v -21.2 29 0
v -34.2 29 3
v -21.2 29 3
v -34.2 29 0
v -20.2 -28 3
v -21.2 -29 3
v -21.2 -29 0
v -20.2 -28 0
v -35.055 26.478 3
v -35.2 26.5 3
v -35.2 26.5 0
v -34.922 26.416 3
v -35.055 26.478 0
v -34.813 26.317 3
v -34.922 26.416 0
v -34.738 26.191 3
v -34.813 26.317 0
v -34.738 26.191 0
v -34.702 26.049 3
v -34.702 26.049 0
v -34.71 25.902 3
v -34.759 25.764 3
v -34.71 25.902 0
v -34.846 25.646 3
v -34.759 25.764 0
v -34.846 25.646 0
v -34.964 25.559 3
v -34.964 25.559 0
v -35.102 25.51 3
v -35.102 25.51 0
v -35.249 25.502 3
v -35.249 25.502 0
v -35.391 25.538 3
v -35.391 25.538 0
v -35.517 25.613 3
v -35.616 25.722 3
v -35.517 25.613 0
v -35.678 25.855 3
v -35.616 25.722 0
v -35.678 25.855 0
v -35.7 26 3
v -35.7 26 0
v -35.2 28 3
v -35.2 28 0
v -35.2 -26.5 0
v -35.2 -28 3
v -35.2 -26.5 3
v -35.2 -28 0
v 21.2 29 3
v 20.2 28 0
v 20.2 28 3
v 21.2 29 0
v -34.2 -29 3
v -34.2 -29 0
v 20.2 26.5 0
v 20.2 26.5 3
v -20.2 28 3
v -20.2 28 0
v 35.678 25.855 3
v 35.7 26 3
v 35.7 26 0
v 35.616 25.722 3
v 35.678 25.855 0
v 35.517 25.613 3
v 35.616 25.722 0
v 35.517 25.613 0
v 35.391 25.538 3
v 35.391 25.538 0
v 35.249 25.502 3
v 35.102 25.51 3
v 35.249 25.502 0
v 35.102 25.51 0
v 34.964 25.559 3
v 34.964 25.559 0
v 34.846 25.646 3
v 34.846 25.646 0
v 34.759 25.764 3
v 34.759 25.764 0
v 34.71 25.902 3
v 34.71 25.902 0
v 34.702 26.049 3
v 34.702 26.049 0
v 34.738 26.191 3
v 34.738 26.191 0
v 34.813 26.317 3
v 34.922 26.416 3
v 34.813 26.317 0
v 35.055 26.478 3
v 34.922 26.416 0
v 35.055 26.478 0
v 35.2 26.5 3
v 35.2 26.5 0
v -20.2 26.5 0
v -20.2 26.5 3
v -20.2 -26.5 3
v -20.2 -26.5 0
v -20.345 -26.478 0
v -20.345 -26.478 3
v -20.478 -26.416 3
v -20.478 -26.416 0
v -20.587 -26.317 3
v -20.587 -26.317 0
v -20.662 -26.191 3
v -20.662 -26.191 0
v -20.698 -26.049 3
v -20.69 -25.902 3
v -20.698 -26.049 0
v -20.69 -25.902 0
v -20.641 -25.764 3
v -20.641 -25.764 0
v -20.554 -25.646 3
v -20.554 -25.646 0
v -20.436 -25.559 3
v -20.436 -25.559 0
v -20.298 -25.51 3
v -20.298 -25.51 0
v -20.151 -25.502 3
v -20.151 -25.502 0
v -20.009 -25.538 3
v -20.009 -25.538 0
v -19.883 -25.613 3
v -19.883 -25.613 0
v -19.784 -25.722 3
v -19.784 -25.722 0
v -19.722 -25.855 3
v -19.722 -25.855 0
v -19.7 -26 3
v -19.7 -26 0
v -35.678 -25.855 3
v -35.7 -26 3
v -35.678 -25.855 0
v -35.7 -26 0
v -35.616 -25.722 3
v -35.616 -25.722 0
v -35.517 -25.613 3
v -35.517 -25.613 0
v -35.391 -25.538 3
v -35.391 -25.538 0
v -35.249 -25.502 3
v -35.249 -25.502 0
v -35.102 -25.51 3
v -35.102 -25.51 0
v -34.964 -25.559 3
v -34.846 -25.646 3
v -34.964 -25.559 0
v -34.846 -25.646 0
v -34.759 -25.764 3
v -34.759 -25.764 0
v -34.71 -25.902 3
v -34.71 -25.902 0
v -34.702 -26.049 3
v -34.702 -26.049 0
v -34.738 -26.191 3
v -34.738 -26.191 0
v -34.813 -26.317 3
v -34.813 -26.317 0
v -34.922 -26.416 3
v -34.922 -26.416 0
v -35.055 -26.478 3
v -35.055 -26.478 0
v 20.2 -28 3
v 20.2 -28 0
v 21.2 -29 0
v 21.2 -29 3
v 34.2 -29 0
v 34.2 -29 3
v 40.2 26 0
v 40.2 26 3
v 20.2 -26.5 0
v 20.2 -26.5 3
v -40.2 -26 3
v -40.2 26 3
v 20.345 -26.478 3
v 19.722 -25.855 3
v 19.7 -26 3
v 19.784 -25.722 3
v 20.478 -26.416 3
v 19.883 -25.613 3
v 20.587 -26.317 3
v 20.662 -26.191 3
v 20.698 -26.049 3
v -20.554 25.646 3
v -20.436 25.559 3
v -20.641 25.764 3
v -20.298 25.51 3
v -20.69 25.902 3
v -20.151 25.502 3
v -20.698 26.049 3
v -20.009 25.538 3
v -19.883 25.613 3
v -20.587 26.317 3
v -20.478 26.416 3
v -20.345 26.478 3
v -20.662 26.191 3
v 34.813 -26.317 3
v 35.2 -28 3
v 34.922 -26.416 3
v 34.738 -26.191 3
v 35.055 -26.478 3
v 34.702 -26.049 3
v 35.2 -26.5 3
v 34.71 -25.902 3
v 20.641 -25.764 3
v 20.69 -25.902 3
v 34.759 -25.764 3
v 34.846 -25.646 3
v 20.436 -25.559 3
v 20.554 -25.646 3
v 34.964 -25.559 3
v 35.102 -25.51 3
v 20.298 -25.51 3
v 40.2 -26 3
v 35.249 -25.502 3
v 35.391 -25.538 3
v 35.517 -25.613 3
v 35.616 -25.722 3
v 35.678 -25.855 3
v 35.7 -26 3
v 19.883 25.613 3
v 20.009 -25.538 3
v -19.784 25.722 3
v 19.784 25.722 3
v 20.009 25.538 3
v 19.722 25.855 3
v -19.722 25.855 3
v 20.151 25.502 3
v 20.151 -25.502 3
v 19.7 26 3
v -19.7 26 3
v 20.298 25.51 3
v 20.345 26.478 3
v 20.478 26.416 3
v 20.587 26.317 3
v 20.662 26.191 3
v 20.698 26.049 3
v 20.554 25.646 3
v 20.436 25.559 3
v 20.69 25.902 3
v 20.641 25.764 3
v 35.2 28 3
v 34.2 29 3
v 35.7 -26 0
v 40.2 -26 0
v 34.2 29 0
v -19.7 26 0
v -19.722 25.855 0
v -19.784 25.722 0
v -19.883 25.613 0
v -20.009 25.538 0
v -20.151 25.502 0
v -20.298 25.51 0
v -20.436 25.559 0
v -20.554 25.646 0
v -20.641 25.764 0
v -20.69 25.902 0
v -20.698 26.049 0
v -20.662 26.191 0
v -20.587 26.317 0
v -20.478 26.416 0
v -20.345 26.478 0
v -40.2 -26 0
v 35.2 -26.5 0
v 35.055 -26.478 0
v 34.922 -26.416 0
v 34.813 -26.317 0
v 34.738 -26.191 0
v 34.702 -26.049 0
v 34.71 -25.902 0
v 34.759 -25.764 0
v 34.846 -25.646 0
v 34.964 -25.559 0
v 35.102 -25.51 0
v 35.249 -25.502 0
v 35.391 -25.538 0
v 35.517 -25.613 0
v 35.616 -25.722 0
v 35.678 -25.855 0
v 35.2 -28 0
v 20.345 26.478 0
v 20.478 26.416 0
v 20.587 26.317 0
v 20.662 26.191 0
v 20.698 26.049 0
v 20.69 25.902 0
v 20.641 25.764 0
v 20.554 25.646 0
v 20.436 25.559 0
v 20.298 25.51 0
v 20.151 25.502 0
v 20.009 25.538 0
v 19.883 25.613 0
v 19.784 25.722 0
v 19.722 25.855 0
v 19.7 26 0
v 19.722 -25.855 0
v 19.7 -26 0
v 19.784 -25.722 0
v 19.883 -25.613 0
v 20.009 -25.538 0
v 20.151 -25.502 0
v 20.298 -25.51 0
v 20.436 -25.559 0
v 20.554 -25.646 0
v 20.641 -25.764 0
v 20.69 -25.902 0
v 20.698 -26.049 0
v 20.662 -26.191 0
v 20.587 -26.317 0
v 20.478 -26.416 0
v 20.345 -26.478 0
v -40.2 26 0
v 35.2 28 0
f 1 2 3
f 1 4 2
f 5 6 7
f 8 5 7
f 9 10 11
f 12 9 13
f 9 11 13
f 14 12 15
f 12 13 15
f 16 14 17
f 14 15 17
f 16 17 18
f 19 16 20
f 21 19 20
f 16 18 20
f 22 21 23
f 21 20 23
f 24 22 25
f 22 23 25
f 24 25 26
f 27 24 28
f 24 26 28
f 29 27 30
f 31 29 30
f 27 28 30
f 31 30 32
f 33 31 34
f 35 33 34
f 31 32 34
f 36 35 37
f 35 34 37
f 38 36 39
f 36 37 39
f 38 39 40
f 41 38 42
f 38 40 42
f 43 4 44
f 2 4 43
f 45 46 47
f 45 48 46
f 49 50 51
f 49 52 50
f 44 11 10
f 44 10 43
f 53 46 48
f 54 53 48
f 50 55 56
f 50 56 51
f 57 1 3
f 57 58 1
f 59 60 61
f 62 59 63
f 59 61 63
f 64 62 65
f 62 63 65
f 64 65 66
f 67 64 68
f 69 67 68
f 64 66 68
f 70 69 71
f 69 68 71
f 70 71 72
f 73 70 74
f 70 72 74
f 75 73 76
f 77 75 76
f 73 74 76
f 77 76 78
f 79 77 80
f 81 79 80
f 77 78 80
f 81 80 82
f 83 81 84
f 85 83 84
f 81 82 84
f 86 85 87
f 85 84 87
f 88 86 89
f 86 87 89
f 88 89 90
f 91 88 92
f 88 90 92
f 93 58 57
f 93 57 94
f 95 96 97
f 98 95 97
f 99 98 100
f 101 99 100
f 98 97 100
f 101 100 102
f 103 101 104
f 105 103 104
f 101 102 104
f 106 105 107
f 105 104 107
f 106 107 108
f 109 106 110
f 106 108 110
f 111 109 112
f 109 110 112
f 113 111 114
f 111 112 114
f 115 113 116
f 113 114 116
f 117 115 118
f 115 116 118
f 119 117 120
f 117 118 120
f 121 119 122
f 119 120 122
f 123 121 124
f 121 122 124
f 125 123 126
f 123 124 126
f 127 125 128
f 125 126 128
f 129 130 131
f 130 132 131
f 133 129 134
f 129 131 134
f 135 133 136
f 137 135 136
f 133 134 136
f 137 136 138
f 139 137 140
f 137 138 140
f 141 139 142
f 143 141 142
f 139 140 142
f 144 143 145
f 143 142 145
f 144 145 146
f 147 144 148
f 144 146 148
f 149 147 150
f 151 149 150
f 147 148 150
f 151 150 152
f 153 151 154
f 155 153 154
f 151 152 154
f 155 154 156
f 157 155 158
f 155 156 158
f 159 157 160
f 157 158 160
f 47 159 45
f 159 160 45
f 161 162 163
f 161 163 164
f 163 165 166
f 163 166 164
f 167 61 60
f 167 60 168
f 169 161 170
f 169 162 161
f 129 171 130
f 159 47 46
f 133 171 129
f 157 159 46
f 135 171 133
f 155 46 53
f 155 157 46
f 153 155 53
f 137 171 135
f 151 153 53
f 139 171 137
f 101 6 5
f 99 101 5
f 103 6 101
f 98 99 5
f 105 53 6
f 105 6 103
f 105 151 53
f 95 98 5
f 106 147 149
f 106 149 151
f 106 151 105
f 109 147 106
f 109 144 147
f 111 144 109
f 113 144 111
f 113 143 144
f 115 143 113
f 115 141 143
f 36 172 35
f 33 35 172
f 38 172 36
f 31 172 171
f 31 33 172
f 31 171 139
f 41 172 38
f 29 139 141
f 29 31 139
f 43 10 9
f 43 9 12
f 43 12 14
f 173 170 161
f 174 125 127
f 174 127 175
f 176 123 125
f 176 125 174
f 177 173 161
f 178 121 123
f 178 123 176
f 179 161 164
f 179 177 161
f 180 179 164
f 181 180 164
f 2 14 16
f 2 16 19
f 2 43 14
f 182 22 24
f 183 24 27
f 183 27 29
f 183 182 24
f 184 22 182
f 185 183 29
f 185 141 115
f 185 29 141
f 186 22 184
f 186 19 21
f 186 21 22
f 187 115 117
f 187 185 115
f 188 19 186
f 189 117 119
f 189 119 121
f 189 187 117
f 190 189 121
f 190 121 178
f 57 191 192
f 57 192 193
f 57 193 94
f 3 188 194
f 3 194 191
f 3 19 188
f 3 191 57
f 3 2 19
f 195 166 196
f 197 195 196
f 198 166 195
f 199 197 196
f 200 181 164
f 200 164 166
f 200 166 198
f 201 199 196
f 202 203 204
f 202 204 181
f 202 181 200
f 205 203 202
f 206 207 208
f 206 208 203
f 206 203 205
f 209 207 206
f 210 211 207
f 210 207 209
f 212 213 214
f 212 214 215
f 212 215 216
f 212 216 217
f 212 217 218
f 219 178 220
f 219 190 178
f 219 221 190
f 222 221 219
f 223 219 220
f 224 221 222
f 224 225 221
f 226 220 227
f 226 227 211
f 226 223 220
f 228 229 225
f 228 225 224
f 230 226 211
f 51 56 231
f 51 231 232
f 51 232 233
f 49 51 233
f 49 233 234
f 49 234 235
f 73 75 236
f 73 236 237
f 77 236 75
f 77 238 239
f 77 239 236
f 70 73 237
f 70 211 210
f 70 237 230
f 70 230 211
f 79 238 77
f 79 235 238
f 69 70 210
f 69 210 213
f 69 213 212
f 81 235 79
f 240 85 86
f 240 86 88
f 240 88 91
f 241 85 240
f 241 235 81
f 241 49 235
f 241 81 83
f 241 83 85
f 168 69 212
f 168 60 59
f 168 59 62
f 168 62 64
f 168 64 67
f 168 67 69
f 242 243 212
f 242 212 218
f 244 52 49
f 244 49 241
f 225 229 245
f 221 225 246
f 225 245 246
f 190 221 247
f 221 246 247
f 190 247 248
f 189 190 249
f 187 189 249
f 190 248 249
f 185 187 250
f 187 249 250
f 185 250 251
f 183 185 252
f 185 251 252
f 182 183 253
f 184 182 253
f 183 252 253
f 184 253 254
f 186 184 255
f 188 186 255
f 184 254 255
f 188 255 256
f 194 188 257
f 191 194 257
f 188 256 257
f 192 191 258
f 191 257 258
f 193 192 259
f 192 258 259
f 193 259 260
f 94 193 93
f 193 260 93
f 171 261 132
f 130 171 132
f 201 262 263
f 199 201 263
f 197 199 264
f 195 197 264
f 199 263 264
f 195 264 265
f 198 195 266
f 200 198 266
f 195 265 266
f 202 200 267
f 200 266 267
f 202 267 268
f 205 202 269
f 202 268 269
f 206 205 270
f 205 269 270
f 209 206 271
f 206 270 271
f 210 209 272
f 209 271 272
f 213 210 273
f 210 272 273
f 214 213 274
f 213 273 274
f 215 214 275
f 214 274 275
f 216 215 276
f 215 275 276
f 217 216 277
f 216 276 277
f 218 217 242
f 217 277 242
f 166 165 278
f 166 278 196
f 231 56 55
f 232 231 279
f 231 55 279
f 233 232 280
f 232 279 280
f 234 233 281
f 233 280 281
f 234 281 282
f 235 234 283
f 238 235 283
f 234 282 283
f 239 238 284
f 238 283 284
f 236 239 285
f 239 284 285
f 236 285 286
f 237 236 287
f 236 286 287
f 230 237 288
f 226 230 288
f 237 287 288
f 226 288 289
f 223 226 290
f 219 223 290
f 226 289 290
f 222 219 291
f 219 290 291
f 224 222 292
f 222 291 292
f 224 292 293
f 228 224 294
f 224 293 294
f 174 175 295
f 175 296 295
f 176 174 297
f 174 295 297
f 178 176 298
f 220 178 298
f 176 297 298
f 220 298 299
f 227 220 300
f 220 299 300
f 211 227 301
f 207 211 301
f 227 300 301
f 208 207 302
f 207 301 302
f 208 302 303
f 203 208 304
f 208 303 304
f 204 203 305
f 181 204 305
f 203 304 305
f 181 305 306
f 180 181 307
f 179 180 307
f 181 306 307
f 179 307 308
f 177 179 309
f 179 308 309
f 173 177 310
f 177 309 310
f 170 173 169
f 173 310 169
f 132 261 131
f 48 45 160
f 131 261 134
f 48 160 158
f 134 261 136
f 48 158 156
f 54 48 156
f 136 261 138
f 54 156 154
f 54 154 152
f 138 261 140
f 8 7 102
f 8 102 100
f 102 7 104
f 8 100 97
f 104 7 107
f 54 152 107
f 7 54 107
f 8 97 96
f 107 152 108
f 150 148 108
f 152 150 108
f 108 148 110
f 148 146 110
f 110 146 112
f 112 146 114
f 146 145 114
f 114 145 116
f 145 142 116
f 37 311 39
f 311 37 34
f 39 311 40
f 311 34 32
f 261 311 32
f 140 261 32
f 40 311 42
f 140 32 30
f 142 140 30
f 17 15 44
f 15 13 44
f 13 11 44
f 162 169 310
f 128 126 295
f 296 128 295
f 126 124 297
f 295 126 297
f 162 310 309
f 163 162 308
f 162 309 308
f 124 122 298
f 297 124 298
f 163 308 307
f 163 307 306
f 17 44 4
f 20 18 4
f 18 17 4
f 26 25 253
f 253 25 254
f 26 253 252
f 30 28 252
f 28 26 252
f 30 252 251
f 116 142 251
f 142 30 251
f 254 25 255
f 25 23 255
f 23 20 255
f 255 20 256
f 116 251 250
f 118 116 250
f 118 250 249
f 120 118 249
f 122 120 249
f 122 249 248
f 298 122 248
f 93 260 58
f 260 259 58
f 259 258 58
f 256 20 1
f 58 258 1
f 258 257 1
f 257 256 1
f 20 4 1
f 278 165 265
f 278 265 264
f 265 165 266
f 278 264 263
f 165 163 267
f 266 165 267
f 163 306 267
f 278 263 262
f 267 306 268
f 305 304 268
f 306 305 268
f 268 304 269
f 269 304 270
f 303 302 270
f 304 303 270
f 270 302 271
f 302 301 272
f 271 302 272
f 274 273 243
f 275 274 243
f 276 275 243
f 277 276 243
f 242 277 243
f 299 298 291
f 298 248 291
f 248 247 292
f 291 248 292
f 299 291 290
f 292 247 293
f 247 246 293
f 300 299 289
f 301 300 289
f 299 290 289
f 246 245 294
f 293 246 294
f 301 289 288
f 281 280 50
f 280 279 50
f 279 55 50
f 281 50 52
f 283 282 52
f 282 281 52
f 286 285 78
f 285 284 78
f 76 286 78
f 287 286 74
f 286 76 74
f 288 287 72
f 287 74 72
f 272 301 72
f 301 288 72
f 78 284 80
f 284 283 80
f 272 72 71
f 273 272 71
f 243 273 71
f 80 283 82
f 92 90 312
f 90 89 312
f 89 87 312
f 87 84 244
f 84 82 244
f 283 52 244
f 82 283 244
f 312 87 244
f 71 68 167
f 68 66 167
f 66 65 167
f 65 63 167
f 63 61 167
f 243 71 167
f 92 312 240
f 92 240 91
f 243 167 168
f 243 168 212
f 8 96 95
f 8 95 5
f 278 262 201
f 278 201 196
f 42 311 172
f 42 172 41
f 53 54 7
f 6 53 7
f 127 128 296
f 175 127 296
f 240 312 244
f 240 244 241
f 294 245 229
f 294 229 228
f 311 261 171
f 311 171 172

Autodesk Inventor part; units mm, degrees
ref_plane "Plan YZ" through (0, 0, 0) normal (1, 0, 0) x (0, 1, 0)
ref_plane "Plan XZ" through (0, 0, 0) normal (0, 1, 0) x (-1, 0, 0)
ref_plane "Plan XY" through (0, 0, 0) normal (0, 0, 1) x (1, 0, 0)
sketch "Esquisse7" plane through (0, 0, 0) normal (0, 0, 1) x (1, 0, 0)
  line L0 (-40.2, -26) -> (-40.2, 26)
  line L1 (-40.2, 26) -> (-35.2, 26)
  line L2 (-35.2, 26) -> (-35.2, 29)
  line L3 (-35.2, 29) -> (-20.2, 29)
  line L4 (-20.2, 29) -> (-20.2, 26)
  line L5 (20.2, 26) -> (20.2, 29)
  line L6 (20.2, 29) -> (35.2, 29)
  line L7 (35.2, 29) -> (35.2, 26)
  line L8 (35.2, 26) -> (40.2, 26)
  line L9 (40.2, 26) -> (40.2, -26)
  line L10 (40.2, -26) -> (35.2, -26)
  line L11 (35.2, -26) -> (35.2, -29)
  line L12 (35.2, -29) -> (20.2, -29)
  line L13 (20.2, -29) -> (20.2, -26)
  line L14 (-20.2, -26) -> (-20.2, -29)
  line L15 (-35.2, -29) -> (-35.2, -26)
  line L16 (-40.2, -26) -> (-35.2, -26)
  line L17 (-35.2, -29) -> (-20.2, -29)
  line L18 (0, -40.6) -> (0, 40.6) construction
  line L19 (-56.28, 0) -> (56.28, 0) construction
  line L20 (-20.2, -26) -> (-7.5, -26)
  line L21 (7.5, -26) -> (20.2, -26)
  line L22 (-20.2, 26) -> (-7.5, 26)
  line L23 (7.5, 26) -> (20.2, 26)
  line L24 (-7.5, -26) -> (7.5, -26)
  line L25 (-7.5, 26) -> (7.5, 26)
  point P0 (0, 0)
  dimension "d33" = 52
  dimension "d34" = 5
  dimension "d35" = 3
  dimension "d36" = 15
  dimension "d51" = 80.4
extrude "Extrusion3" add sketch "Esquisse7" along normal blind 3
chamfer "Chanfrein5" distance 1 angle 45 8 edges at (-20.2, 29, 1.5) (-35.2, 29, 1.5) (20.2, 29, 1.5) (35.2, 29, 1.5) (35.2, -29, 1.5) (20.2, -29, 1.5) (-20.2, -29, 1.5) (-35.2, -29, 1.5)
sketch "Esquisse10" plane through (0, 0, 3) normal (0, 0, 1) x (1, 0, 0)
  line L0 (-34.2, -29) -> (-35.2, -28) construction
  line L1 (-34.2, -29) -> (-21.2, -29) construction
  line L2 (-20.2, -28) -> (-21.2, -29) construction
  line L3 (-20.2, -28) -> (-20.2, -26) construction
  line L4 (-20.2, -26) -> (20.2, -26) construction
  line L5 (20.2, -26) -> (20.2, -28) construction
  line L6 (21.2, -29) -> (20.2, -28) construction
  line L7 (21.2, -29) -> (34.2, -29) construction
  line L8 (35.2, -28) -> (34.2, -29) construction
  line L9 (35.2, -28) -> (35.2, -26) construction
  line L10 (35.2, -26) -> (40.2, -26) construction
  line L11 (40.2, -26) -> (40.2, 26) construction
  line L12 (40.2, 26) -> (35.2, 26) construction
  line L13 (35.2, 26) -> (35.2, 28) construction
  line L14 (34.2, 29) -> (35.2, 28) construction
  line L15 (34.2, 29) -> (21.2, 29) construction
  line L16 (20.2, 28) -> (21.2, 29) construction
  line L17 (20.2, 28) -> (20.2, 26) construction
  line L18 (20.2, 26) -> (-20.2, 26) construction
  line L19 (-20.2, 26) -> (-20.2, 28) construction
  line L20 (-21.2, 29) -> (-20.2, 28) construction
  line L21 (-21.2, 29) -> (-34.2, 29) construction
  line L22 (-35.2, 28) -> (-34.2, 29) construction
  line L23 (-35.2, 28) -> (-35.2, 26) construction
  line L24 (-35.2, 26) -> (-40.2, 26) construction
  line L25 (-40.2, 26) -> (-40.2, -26) construction
  line L26 (-40.2, -26) -> (-35.2, -26) construction
  line L27 (-35.2, -26) -> (-35.2, -28) construction
  point P0 (0, 0)
hole "Perçage4" at (-35.2, 26, 3) at (-20.2, 26, 3) at (20.2, 26, 3) at (35.2, 26, 3) at (-35.2, -26, 3) at (-20.2, -26, 3) at (20.2, -26, 3) at (35.2, -26, 3) direction (0, 0, -1) diameter 1 end through all
properties part number "P1704_204" material "Plastique PMMA"
